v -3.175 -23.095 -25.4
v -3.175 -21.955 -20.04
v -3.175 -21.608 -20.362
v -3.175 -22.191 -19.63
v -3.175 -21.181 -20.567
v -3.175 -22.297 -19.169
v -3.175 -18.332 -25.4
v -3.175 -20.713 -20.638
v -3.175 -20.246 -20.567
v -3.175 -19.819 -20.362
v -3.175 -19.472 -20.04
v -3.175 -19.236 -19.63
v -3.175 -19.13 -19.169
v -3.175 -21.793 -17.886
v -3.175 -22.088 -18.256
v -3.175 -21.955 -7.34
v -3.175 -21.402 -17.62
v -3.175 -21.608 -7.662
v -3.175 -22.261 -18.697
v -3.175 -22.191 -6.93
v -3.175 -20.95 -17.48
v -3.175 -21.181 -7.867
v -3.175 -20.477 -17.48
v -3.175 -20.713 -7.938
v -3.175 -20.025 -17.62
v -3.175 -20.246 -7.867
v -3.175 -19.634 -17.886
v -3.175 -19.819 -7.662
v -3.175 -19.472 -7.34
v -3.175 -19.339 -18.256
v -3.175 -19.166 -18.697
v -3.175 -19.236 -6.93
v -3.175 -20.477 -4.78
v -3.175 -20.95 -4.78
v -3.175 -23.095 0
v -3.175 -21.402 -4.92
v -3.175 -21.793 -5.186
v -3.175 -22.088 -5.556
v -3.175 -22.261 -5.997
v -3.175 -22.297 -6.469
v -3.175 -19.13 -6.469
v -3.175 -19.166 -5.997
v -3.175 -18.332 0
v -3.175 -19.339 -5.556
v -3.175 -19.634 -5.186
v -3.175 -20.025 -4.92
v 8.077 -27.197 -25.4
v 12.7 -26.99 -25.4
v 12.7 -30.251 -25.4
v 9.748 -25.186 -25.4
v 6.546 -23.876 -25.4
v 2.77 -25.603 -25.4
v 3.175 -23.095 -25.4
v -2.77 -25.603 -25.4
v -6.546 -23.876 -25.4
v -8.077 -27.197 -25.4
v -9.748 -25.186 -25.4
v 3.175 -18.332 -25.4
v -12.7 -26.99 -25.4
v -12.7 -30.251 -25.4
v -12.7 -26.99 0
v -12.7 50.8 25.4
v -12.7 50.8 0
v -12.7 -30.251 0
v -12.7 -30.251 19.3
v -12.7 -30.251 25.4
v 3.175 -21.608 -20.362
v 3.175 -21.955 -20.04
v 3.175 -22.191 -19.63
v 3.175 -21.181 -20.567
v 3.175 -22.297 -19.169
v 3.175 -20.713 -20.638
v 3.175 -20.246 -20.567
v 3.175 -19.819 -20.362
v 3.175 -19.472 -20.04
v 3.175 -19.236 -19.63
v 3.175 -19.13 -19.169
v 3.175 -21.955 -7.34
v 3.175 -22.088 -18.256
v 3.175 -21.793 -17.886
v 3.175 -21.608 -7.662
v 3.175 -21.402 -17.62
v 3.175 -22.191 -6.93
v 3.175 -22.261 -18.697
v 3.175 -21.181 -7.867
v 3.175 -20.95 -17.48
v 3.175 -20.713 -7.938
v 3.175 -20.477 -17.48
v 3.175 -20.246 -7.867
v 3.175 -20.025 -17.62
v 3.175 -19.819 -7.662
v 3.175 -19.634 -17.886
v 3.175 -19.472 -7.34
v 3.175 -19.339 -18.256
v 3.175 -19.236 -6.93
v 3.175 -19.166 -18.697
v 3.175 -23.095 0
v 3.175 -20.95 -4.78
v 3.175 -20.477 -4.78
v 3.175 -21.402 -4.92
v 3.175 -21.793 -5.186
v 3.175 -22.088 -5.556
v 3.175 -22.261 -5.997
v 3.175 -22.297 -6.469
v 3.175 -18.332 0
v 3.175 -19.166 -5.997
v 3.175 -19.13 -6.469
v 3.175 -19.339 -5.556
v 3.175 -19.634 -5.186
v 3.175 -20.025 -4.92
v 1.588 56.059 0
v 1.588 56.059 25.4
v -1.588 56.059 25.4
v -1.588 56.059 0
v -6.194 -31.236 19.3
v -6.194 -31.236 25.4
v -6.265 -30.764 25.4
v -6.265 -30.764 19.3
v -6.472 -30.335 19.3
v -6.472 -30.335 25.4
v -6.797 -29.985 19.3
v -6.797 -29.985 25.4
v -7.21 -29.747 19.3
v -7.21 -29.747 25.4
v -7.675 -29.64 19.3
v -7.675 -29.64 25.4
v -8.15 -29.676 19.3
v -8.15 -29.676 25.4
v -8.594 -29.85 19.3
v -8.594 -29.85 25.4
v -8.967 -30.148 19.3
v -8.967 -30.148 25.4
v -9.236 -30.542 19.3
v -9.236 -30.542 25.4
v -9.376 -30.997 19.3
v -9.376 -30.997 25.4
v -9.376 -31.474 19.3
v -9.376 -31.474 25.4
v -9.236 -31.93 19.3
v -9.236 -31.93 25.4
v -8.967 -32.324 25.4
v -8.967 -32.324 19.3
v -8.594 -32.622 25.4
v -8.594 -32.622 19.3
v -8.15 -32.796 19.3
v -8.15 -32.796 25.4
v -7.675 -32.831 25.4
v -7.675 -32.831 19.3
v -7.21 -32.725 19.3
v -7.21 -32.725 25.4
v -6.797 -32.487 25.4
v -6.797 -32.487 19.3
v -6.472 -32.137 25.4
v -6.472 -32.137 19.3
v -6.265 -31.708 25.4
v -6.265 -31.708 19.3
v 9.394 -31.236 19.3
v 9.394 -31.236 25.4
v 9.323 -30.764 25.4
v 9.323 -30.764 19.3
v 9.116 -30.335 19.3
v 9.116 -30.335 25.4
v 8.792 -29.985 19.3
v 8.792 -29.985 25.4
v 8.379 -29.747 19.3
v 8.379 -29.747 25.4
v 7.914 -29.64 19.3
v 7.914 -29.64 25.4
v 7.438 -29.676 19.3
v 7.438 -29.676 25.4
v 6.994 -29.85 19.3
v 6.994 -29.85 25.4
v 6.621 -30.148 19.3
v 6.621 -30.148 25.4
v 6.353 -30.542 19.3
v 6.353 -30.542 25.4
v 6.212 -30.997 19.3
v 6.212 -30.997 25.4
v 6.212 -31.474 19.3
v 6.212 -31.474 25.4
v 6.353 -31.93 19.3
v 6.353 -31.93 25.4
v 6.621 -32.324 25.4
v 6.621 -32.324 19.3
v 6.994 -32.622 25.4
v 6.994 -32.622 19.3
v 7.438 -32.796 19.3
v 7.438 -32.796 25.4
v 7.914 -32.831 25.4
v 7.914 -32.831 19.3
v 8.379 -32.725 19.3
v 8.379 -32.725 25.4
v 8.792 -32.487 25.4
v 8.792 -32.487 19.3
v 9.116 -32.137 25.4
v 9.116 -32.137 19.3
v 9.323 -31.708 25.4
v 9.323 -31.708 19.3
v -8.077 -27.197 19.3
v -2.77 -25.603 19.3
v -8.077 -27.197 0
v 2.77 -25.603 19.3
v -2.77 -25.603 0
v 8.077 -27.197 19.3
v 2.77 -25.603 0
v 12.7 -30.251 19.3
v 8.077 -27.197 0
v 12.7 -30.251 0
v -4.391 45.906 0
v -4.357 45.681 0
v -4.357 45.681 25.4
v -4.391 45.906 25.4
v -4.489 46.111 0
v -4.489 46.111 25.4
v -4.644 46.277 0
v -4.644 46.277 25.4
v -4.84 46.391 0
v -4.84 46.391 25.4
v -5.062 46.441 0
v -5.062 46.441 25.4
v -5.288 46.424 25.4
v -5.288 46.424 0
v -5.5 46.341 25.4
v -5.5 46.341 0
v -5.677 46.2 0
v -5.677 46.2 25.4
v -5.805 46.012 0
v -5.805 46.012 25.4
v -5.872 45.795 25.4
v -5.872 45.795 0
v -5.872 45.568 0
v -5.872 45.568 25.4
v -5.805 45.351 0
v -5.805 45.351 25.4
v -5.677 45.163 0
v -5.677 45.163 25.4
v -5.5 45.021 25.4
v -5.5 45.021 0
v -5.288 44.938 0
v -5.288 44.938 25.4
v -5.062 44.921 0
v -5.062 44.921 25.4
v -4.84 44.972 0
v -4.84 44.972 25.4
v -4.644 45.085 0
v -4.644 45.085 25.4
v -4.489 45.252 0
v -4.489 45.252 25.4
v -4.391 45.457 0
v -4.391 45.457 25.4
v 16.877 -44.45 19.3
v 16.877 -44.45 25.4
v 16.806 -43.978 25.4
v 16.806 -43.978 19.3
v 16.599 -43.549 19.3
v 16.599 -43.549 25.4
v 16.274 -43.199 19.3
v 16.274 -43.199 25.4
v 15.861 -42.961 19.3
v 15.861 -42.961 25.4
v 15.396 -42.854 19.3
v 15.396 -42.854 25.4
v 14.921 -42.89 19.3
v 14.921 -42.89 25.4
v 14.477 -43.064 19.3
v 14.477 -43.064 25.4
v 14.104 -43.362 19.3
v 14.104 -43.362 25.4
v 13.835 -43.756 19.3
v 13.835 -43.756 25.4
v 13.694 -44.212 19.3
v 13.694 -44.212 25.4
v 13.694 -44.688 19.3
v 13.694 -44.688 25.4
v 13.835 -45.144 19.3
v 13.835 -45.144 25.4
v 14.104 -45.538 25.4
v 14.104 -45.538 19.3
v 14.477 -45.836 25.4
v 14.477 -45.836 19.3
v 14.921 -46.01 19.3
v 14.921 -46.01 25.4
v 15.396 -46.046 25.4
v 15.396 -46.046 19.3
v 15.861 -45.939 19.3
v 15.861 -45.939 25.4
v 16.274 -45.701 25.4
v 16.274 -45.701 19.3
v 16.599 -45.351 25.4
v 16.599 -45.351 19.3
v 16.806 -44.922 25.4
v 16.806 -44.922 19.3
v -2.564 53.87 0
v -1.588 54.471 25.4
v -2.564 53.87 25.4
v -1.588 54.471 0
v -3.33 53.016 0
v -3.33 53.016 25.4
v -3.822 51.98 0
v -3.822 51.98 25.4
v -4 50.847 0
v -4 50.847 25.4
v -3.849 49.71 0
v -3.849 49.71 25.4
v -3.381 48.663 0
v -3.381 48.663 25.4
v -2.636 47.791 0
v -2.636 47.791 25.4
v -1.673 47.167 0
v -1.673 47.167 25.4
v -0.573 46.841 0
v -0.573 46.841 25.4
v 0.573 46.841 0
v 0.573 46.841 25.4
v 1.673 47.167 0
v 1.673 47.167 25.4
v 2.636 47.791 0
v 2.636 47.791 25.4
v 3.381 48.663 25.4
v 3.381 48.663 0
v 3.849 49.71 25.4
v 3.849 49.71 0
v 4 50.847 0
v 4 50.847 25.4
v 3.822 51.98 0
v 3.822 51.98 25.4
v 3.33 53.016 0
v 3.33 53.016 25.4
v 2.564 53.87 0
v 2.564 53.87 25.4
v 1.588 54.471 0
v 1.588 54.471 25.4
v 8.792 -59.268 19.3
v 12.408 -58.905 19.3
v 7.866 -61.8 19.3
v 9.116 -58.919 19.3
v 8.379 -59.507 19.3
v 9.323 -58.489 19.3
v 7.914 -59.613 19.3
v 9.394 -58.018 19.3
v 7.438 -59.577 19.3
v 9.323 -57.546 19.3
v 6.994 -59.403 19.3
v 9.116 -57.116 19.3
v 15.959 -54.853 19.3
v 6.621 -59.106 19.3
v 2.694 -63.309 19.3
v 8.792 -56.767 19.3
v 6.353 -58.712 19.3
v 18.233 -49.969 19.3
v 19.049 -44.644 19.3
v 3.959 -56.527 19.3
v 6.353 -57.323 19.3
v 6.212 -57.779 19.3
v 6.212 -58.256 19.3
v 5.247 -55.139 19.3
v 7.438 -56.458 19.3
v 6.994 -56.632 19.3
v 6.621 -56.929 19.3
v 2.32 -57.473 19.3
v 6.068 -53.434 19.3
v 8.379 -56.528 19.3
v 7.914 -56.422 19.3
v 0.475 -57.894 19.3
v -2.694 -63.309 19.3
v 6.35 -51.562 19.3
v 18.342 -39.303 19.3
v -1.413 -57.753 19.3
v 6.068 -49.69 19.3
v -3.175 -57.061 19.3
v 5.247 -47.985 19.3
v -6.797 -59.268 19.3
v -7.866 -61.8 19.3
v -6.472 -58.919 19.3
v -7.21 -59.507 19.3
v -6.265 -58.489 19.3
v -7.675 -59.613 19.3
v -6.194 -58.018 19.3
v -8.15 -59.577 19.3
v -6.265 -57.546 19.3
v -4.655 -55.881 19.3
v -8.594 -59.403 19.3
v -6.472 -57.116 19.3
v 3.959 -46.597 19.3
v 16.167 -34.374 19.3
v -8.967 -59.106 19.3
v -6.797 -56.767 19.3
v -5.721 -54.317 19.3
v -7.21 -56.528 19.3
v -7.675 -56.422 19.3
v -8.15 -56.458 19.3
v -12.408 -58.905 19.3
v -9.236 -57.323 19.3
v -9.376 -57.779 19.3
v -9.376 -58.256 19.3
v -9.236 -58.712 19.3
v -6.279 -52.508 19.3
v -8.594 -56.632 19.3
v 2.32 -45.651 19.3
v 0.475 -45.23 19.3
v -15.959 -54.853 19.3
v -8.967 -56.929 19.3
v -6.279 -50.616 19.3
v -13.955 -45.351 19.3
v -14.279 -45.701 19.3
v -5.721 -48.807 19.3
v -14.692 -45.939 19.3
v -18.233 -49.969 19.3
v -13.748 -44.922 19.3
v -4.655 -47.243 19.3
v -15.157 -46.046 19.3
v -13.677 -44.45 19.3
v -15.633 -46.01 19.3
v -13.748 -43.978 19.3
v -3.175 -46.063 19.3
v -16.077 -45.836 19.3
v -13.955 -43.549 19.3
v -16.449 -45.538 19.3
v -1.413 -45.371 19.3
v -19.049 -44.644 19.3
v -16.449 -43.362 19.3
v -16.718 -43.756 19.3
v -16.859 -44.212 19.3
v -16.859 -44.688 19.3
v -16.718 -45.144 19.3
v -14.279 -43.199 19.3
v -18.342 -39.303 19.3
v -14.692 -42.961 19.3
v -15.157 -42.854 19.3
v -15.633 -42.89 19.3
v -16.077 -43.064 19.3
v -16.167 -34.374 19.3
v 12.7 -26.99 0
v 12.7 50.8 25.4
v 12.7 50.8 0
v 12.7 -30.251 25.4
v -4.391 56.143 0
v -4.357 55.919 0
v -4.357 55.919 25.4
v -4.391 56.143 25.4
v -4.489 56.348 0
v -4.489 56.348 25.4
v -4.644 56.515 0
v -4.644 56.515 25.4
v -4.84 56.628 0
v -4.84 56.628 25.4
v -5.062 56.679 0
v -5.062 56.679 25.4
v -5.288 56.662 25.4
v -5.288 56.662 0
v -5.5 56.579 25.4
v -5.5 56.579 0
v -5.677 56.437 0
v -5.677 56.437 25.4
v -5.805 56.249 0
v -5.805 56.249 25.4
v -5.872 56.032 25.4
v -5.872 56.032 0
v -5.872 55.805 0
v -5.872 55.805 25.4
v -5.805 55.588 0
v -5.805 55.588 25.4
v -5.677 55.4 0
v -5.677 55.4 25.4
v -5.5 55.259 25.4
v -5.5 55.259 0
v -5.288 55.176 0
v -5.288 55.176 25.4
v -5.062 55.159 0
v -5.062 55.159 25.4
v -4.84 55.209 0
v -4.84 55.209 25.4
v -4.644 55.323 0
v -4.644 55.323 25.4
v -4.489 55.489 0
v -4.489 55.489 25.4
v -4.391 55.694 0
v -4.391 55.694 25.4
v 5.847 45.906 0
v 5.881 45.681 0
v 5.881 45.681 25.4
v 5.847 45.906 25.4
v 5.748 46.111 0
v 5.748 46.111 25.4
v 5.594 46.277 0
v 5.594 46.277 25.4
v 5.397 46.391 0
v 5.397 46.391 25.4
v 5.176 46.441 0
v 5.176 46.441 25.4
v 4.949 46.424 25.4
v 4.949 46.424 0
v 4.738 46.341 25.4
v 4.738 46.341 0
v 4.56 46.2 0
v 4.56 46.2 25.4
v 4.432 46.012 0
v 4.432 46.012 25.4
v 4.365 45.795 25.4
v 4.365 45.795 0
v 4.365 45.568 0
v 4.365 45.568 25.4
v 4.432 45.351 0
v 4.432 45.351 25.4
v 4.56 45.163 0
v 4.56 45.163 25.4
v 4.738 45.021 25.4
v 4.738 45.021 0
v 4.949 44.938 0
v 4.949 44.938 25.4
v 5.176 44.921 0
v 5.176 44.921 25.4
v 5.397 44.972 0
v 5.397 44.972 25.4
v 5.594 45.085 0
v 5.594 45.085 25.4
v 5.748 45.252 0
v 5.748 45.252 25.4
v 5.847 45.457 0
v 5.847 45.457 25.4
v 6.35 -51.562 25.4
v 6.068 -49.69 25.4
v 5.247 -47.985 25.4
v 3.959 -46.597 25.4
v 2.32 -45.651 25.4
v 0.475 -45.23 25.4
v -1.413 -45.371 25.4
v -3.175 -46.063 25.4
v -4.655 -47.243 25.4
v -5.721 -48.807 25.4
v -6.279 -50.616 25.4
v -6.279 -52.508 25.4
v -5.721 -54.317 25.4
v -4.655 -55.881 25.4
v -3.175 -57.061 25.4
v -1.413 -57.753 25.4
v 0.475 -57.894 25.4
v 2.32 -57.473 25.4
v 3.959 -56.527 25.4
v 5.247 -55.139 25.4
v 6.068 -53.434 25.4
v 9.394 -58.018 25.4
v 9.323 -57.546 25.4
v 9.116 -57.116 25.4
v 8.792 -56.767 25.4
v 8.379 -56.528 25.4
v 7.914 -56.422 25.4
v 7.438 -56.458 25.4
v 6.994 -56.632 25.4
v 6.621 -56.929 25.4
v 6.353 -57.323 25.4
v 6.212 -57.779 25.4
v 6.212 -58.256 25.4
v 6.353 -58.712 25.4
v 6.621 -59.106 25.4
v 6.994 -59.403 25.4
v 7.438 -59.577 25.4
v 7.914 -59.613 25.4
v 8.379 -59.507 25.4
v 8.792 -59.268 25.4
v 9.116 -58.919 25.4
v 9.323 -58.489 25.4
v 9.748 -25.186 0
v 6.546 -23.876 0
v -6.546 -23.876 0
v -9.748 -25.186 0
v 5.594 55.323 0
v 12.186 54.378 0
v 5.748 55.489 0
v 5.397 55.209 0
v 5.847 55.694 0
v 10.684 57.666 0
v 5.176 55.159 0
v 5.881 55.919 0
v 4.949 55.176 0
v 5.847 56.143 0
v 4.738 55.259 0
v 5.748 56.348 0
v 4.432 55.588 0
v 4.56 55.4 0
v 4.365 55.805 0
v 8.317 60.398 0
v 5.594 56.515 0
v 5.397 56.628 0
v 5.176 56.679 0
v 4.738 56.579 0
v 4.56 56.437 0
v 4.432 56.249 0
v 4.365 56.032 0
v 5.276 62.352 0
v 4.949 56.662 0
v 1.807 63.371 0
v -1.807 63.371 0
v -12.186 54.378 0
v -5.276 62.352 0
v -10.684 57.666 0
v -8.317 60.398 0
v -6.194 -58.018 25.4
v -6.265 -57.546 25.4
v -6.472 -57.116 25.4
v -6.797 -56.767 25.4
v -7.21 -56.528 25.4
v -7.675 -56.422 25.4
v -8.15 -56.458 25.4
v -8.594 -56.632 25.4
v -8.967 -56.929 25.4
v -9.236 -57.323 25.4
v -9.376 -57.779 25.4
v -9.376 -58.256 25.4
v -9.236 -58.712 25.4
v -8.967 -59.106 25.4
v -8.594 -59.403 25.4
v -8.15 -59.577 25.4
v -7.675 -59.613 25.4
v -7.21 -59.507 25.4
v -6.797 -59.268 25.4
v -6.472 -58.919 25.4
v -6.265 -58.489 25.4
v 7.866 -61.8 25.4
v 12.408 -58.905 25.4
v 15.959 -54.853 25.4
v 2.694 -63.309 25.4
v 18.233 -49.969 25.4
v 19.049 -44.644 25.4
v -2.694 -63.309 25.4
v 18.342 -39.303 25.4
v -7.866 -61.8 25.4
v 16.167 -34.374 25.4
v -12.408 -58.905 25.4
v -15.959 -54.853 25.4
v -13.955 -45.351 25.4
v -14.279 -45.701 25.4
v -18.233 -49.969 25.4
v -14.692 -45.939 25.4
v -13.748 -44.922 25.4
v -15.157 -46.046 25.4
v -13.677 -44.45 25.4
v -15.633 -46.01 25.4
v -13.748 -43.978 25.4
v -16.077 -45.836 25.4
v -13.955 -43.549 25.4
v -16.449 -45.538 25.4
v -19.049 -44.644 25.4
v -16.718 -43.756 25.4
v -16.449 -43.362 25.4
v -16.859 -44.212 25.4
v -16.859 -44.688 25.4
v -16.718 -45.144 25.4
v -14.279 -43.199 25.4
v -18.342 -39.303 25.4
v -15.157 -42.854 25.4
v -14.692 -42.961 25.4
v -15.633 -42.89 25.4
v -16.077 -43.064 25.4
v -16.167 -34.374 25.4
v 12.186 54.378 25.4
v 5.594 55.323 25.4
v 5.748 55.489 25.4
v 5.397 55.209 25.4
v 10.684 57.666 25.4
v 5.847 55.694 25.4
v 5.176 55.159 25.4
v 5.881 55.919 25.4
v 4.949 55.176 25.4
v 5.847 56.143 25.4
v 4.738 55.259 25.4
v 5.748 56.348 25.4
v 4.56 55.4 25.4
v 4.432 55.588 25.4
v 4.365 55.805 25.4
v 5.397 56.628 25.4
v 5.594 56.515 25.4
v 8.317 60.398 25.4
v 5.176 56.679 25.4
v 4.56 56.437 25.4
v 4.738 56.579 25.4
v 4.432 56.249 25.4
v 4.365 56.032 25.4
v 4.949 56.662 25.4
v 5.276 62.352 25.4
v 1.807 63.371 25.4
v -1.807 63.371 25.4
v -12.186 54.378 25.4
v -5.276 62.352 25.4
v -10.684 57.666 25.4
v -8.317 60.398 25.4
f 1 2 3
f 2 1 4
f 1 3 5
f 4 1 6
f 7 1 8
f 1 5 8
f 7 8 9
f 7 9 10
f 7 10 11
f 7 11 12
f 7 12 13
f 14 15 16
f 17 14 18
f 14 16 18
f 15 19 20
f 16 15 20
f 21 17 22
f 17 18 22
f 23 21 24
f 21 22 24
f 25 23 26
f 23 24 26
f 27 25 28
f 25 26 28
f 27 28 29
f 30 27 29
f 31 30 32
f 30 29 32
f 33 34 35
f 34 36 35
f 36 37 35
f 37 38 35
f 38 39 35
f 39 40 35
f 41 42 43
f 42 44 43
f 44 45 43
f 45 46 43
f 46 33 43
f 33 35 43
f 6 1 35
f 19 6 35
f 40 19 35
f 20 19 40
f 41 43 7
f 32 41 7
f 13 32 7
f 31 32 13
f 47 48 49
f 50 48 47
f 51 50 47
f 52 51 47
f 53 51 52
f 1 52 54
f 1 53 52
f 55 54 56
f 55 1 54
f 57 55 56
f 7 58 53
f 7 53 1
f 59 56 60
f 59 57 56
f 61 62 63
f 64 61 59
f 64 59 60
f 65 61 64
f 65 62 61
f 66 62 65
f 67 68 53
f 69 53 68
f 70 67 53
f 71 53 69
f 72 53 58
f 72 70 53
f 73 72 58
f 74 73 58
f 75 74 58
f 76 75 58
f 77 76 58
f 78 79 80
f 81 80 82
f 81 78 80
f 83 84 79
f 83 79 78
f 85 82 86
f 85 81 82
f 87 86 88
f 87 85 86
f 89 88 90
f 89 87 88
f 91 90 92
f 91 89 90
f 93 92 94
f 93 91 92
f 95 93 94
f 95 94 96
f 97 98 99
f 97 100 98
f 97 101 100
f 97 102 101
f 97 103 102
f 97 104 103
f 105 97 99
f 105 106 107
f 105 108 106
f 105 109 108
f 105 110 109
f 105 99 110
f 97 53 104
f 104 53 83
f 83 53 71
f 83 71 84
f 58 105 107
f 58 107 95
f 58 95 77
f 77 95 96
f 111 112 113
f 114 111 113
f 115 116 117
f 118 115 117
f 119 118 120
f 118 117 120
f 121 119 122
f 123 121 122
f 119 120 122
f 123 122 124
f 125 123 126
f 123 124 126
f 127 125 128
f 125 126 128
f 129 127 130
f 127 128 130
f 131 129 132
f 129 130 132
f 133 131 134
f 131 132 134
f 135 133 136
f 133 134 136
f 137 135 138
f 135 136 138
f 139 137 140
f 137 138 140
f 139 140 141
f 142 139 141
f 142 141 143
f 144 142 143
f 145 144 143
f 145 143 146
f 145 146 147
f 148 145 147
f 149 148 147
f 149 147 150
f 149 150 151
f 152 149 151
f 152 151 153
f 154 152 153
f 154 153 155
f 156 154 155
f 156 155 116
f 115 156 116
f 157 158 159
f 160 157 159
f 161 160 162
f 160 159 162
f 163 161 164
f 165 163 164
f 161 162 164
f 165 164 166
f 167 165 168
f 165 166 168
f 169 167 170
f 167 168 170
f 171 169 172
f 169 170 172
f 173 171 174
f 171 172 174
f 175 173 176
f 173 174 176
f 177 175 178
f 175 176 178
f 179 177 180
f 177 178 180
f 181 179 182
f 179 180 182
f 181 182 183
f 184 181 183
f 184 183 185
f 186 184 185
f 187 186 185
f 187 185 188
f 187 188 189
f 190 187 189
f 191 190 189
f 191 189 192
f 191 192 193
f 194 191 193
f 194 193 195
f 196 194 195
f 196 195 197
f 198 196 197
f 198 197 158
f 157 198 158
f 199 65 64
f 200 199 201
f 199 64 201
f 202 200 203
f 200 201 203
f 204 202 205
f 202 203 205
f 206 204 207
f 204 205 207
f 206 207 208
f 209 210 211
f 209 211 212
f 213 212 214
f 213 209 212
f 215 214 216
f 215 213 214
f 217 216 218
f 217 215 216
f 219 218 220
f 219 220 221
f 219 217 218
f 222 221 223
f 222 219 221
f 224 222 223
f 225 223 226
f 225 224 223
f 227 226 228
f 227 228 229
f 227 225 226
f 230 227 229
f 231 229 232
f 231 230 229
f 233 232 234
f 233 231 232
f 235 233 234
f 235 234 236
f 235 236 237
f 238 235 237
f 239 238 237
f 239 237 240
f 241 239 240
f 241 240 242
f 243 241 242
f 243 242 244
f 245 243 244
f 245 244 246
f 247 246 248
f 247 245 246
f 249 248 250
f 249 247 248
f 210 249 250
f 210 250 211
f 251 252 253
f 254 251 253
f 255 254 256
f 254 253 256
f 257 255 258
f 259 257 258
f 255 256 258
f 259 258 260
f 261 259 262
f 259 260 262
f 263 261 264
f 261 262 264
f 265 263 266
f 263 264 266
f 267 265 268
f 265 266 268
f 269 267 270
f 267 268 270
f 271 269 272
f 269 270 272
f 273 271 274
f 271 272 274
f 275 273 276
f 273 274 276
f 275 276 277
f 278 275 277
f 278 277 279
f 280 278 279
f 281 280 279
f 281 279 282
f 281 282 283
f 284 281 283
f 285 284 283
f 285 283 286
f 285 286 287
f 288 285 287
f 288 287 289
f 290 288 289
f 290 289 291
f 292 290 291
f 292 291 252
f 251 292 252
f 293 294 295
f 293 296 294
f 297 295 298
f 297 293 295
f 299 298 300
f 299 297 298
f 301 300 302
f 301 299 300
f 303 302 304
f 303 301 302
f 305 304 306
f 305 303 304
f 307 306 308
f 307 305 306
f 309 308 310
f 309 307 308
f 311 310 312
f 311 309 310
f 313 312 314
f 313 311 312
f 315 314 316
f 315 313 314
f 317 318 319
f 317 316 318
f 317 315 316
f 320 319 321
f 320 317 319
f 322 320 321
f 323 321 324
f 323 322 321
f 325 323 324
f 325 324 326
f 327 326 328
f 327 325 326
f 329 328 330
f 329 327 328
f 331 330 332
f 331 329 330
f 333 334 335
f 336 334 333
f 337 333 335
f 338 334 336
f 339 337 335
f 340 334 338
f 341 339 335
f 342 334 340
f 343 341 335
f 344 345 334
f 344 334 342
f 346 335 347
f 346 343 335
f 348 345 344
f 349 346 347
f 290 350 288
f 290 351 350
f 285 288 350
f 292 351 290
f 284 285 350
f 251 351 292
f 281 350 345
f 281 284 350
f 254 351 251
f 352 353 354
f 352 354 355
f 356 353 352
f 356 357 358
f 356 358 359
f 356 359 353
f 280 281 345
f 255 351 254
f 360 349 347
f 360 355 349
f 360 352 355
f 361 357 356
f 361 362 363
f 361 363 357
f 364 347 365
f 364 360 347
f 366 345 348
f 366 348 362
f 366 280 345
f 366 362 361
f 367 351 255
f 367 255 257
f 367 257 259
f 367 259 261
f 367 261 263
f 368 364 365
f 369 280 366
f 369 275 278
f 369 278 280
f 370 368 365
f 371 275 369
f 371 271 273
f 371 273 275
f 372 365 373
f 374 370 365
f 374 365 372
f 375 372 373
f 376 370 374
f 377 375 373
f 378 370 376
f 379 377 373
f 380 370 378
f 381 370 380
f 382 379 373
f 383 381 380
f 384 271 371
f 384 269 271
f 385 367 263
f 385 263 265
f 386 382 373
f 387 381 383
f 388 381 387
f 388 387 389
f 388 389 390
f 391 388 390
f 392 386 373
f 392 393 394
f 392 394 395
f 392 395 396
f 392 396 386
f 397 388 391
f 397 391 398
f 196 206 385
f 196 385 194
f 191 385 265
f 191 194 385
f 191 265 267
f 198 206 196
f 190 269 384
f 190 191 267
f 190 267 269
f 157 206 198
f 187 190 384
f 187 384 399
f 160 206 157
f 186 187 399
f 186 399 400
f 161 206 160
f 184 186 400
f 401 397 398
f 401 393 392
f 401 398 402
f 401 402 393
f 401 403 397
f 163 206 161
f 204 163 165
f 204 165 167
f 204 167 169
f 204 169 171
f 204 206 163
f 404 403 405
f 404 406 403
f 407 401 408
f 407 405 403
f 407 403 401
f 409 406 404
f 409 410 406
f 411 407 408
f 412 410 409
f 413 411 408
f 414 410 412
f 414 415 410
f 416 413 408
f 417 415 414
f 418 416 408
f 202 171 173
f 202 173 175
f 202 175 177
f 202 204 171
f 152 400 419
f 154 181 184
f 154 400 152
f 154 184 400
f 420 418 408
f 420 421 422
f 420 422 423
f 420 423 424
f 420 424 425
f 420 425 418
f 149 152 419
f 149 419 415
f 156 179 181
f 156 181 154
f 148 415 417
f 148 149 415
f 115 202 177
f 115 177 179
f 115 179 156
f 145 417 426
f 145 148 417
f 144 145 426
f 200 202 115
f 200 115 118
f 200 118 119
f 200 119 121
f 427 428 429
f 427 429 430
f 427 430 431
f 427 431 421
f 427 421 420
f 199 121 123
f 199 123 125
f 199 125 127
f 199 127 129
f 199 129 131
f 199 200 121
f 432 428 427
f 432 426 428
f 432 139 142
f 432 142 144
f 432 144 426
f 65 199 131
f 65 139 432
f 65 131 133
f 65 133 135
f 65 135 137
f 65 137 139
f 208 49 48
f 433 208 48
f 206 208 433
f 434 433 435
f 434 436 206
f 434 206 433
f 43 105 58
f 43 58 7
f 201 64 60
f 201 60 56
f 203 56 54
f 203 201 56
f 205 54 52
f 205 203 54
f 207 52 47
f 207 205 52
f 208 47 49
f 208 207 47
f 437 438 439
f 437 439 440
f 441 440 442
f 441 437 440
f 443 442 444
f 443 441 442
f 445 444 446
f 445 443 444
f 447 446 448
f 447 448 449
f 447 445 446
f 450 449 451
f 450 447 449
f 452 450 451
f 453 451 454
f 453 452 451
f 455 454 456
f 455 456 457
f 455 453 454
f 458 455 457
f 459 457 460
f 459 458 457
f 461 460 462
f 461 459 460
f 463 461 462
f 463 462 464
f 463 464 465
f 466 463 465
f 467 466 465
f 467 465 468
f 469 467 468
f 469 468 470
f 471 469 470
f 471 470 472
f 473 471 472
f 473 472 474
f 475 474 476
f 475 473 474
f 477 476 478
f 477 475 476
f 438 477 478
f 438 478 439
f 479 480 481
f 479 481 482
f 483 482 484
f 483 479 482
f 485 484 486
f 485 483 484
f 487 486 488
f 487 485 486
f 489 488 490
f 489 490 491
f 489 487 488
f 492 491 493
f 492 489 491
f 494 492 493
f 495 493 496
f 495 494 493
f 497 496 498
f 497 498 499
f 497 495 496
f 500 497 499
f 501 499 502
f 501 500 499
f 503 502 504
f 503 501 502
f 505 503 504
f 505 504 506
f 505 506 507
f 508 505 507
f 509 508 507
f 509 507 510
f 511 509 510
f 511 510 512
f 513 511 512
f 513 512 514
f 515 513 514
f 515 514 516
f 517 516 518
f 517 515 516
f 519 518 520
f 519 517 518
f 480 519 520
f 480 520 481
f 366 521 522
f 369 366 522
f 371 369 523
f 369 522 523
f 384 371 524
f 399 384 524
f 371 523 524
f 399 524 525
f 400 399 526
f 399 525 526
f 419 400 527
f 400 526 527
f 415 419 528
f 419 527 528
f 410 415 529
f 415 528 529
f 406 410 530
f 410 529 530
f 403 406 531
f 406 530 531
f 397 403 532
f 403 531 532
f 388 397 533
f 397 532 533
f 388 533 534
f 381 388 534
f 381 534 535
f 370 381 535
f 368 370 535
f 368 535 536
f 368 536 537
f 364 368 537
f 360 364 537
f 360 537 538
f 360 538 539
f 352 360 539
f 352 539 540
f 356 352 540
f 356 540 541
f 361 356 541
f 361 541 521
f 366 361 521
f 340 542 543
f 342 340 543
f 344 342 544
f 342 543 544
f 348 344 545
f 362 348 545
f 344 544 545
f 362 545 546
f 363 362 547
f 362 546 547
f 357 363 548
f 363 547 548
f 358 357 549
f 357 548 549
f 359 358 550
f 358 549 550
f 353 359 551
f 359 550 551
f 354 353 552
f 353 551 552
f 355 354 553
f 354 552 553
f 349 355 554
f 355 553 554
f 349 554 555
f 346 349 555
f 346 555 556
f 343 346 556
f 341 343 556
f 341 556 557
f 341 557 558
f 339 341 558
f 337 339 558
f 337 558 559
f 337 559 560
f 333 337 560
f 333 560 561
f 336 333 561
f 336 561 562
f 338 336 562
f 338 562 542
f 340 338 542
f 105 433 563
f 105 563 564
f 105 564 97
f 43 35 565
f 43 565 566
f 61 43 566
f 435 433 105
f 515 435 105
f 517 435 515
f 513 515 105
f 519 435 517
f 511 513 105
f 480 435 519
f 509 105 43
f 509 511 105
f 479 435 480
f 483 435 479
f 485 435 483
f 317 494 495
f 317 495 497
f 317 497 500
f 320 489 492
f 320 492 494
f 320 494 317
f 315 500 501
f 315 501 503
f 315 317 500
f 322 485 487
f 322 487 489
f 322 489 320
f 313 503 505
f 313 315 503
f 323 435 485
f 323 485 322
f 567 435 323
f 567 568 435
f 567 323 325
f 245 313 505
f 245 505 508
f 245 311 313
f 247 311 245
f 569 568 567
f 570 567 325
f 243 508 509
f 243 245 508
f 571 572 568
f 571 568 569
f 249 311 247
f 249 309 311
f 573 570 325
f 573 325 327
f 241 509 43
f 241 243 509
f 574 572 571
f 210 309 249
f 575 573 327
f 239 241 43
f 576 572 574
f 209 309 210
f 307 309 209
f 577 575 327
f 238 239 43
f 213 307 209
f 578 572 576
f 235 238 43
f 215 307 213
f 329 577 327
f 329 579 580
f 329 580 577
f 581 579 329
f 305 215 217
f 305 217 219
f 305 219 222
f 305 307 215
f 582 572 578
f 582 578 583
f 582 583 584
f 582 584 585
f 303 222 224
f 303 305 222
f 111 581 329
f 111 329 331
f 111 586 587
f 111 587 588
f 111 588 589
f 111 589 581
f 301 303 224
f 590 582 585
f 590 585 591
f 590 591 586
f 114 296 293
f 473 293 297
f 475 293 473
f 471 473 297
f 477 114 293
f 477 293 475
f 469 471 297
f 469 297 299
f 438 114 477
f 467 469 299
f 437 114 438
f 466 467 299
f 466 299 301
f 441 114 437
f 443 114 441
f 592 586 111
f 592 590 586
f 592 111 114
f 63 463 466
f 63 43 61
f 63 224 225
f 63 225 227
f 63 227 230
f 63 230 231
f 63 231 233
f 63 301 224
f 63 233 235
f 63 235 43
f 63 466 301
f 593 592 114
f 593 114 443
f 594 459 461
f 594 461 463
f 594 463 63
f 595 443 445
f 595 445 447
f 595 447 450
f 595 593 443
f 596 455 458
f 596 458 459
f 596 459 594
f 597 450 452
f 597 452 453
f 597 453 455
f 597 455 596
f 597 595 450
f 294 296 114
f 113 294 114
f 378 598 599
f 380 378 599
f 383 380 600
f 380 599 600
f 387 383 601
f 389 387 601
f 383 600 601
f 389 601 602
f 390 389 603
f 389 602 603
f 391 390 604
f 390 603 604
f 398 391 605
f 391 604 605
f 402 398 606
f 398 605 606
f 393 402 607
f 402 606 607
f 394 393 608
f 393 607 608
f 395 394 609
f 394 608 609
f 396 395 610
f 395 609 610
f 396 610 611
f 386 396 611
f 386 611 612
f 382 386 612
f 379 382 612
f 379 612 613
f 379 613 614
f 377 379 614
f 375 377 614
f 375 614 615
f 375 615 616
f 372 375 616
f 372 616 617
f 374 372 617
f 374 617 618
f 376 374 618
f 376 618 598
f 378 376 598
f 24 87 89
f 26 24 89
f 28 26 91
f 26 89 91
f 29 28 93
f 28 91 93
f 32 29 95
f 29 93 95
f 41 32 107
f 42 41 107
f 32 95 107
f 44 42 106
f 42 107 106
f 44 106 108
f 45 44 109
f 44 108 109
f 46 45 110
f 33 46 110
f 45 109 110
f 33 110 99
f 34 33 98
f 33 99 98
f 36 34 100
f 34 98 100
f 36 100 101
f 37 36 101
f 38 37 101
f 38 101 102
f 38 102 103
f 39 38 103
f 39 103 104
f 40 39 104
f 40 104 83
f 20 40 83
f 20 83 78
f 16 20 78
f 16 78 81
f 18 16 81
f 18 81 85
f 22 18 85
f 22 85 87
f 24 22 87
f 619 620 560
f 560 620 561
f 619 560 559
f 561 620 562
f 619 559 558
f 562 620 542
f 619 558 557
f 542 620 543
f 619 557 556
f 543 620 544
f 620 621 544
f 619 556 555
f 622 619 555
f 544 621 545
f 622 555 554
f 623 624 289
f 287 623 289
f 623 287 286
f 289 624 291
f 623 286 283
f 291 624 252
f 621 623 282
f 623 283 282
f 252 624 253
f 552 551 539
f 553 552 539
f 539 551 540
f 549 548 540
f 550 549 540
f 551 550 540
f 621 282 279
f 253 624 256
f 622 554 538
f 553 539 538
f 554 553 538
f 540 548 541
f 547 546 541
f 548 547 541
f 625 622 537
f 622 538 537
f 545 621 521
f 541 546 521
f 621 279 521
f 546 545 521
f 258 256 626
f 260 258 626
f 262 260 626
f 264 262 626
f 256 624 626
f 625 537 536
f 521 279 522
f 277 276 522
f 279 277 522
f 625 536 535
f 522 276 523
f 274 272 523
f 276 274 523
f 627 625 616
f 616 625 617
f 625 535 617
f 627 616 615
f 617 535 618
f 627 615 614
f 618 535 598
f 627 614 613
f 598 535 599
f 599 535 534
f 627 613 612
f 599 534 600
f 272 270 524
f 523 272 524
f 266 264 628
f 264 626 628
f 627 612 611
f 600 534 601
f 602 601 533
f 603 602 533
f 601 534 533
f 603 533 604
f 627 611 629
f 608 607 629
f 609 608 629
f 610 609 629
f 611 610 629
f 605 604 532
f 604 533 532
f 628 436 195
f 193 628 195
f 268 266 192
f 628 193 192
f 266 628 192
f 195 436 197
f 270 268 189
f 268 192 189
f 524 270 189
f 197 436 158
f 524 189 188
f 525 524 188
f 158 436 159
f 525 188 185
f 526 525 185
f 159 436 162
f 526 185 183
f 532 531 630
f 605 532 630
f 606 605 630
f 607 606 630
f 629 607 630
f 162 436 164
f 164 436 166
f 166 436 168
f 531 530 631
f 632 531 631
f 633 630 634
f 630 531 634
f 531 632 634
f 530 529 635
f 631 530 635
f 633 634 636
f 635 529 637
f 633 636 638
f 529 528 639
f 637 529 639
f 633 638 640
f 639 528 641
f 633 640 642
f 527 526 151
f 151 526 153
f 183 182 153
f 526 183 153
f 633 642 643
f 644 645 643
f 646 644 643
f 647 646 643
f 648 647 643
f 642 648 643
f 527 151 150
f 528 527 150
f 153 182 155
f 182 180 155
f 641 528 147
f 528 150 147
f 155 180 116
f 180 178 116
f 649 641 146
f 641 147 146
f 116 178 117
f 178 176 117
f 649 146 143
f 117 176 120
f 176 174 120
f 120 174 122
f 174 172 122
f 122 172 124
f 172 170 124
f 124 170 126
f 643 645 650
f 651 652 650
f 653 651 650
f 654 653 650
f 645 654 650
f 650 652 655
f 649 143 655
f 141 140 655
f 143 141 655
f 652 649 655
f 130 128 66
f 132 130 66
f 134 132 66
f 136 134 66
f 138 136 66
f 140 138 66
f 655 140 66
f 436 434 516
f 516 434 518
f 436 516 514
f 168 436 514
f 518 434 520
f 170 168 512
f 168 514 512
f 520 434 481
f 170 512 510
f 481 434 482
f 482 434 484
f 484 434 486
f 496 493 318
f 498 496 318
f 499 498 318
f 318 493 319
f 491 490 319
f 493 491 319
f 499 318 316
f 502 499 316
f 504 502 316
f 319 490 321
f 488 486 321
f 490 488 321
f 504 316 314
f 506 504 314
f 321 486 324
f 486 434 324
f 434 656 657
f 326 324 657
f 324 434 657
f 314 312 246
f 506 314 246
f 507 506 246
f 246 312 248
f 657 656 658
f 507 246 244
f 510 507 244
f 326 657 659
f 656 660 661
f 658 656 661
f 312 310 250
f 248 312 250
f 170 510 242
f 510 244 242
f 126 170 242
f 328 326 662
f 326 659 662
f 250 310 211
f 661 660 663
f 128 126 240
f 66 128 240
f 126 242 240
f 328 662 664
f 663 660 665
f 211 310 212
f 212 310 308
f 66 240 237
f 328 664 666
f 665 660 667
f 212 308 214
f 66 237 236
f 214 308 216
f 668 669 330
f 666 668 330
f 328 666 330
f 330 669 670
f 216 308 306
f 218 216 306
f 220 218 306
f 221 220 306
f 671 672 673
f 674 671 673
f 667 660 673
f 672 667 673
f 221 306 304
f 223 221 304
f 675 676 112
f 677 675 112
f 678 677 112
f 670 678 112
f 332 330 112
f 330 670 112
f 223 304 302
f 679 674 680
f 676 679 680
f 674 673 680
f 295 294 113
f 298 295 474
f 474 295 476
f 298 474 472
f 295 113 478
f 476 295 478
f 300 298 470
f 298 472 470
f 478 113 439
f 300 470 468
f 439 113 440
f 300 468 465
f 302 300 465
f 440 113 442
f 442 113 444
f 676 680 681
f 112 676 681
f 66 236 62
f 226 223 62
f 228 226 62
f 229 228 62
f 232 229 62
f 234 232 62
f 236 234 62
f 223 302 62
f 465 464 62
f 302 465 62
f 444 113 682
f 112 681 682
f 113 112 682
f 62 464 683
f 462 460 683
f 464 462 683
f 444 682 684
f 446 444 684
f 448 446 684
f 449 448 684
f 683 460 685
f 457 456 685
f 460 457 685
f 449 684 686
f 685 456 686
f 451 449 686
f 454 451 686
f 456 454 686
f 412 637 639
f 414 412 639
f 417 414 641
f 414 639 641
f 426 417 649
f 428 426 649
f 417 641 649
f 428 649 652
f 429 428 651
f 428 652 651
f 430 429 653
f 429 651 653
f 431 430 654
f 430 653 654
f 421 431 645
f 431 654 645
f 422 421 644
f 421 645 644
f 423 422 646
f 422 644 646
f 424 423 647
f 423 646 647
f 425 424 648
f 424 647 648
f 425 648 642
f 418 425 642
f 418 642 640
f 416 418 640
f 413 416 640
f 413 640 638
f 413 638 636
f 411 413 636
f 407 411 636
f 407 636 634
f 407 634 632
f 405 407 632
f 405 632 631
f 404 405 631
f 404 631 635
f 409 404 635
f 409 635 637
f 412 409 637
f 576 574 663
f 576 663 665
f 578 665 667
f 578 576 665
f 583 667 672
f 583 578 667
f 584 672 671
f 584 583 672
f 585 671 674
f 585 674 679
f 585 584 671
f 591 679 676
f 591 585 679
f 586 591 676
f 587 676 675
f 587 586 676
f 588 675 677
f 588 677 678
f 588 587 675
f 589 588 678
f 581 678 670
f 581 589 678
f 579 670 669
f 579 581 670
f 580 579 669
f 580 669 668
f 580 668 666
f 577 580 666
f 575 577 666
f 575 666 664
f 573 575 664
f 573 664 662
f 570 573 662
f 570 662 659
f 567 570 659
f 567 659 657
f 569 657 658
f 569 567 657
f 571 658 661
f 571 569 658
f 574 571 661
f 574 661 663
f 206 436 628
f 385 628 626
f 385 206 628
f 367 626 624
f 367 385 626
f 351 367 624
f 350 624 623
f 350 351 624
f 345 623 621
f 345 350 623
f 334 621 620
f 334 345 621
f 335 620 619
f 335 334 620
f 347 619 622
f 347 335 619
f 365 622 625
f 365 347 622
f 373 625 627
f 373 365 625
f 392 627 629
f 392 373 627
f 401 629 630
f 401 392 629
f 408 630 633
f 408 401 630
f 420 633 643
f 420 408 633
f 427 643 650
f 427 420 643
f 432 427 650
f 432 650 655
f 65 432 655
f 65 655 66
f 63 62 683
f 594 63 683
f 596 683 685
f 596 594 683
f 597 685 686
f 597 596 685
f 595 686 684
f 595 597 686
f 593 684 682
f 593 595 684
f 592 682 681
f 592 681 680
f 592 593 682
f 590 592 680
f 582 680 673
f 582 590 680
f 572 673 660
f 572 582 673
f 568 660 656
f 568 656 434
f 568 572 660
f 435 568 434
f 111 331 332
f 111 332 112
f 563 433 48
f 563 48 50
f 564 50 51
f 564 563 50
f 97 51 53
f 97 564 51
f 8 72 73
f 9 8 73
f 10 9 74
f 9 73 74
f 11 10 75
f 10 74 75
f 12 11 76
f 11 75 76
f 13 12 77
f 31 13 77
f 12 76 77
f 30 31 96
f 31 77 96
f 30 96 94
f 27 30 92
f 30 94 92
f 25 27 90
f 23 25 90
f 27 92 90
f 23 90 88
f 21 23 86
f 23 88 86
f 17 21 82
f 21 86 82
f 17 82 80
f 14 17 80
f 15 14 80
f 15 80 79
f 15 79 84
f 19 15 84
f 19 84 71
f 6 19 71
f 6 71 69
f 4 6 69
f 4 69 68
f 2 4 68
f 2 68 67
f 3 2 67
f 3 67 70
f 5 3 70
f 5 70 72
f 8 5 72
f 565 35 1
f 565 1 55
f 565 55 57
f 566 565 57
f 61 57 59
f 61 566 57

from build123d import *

# Parameters (mm, degrees)
SKETCH1_R           = 4
SKETCH1_R_2         = 0.762
BOSS_EXTRUDE1_DEPTH = 25.4
SKETCH2_R           = 19.05
BOSS_EXTRUDE2_DEPTH = 25.4
SKETCH5_R           = 6.35
CUT_EXTRUDE2_DEPTH  = 25.4
SKETCH3_R           = 1.6
CUT_EXTRUDE1_DEPTH  = 25.4
SKETCH6_W           = 3.175
SKETCH6_H           = 1.5875
CUT_EXTRUDE3_DEPTH  = 25.4
SKETCH8_R           = 19.05
CUT_EXTRUDE4_DEPTH  = 19.3
BOSS_EXTRUDE3_DEPTH = 25.4
SKETCH10_W          = 6.35
SKETCH10_H          = 4.7625
BOSS_EXTRUDE4_DEPTH = 25.4
SKETCH11_R          = 1.5875
CUT_EXTRUDE5_DEPTH  = 23.225


with BuildPart() as part:
    # Sketch1 → Boss-Extrude1 (new body)
    with BuildSketch(Plane.XY):
        with BuildLine():
            Line((12.7, 50.8), (12.7, -50.8))
            ThreePointArc((12.7, -50.8), (0, -63.5), (-12.7, -50.8))
            Line((-12.7, -50.8), (-12.7, 50.8))
            ThreePointArc((-12.7, 50.8), (0, 63.5), (12.7, 50.8))
        make_face()
        with Locations((0, 50.8)):
            Circle(SKETCH1_R, mode=Mode.SUBTRACT)
        with Locations((-5.118745989, 55.918745989)):
            Circle(SKETCH1_R_2, mode=Mode.SUBTRACT)
        with Locations((5.118745989, 55.918745989)):
            Circle(SKETCH1_R_2, mode=Mode.SUBTRACT)
        with Locations((5.118745989, 45.681254011)):
            Circle(SKETCH1_R_2, mode=Mode.SUBTRACT)
        with Locations((-5.118745989, 45.681254011)):
            Circle(SKETCH1_R_2, mode=Mode.SUBTRACT)
    extrude(amount=BOSS_EXTRUDE1_DEPTH)

    # Sketch2 → Boss-Extrude2 (add)
    with BuildSketch(Plane(origin=(0, 0, 0), x_dir=(-1, 0, 0), z_dir=(0, 0, -1))):
        with Locations((0, -44.45)):
            Circle(SKETCH2_R)
    extrude(amount=-BOSS_EXTRUDE2_DEPTH)

    # Sketch5 → Cut-Extrude2 (cut)
    with BuildSketch(Plane.XY.offset(25.4)):
        with Locations((0, -51.562)):
            Circle(SKETCH5_R)
    extrude(amount=-CUT_EXTRUDE2_DEPTH, mode=Mode.SUBTRACT)

    # Sketch3 → Cut-Extrude1 (cut)
    with BuildSketch(Plane.XY.offset(25.4)):
        with Locations((-7.794229315, -31.235903463)):
            Circle(SKETCH3_R)
        with Locations((-15.2766, -44.45)):
            Circle(SKETCH3_R)
        with Locations((15.2766, -44.45)):
            Circle(SKETCH3_R)
        with Locations((-7.794229315, -58.017540858)):
            Circle(SKETCH3_R)
        with Locations((7.794229315, -31.235903463)):
            Circle(SKETCH3_R)
        with Locations((7.794229315, -58.017540858)):
            Circle(SKETCH3_R)
    extrude(amount=-CUT_EXTRUDE1_DEPTH, mode=Mode.SUBTRACT)

    # Sketch6 → Cut-Extrude3 (cut)
    with BuildSketch(Plane(origin=(0, 0, 0), x_dir=(-1, 0, 0), z_dir=(0, 0, -1))):
        with Locations((0, 55.265240671)):
            Rectangle(SKETCH6_W, SKETCH6_H)
    extrude(amount=-CUT_EXTRUDE3_DEPTH, mode=Mode.SUBTRACT)

    # Sketch8 → Cut-Extrude4 (cut)
    with BuildSketch(Plane(origin=(0, 0, 0), x_dir=(-1, 0, 0), z_dir=(0, 0, -1))):
        with Locations((0, -44.45)):
            Circle(SKETCH8_R)
    extrude(amount=-CUT_EXTRUDE4_DEPTH, mode=Mode.SUBTRACT)

    # Sketch9 → Boss-Extrude3 (add)
    with BuildSketch(Plane(origin=(0, 0, 0), x_dir=(-1, 0, 0), z_dir=(0, 0, -1))):
        with BuildLine():
            Line((-12.7, -30.250968343), (-12.7, -26.990386602))
            ThreePointArc((-12.7, -26.990386602), (0, -22.86), (12.7, -26.990386602))
            Line((12.7, -26.990386602), (12.7, -30.250968343))
            ThreePointArc((12.7, -30.250968343), (0, -25.4), (-12.7, -30.250968343))
        make_face()
    extrude(amount=BOSS_EXTRUDE3_DEPTH)

    # Sketch10 → Boss-Extrude4 (add)
    with BuildSketch(Plane(origin=(0, 0, 0), x_dir=(-1, 0, 0), z_dir=(0, 0, -1))):
        with Locations((0, -20.713481915)):
            Rectangle(SKETCH10_W, SKETCH10_H)
    extrude(amount=BOSS_EXTRUDE4_DEPTH)

    # Sketch11 → Cut-Extrude5 (cut, through all)
    with BuildSketch(Plane(origin=(3.175, 0, 0), x_dir=(0, 0, -1), z_dir=(1, 0, 0))):
        with Locations((6.35, -20.713481915)):
            Circle(SKETCH11_R)
        with Locations((19.05, -20.713481915)):
            Circle(SKETCH11_R)
    extrude(amount=-CUT_EXTRUDE5_DEPTH, mode=Mode.SUBTRACT)


solid = part.part
